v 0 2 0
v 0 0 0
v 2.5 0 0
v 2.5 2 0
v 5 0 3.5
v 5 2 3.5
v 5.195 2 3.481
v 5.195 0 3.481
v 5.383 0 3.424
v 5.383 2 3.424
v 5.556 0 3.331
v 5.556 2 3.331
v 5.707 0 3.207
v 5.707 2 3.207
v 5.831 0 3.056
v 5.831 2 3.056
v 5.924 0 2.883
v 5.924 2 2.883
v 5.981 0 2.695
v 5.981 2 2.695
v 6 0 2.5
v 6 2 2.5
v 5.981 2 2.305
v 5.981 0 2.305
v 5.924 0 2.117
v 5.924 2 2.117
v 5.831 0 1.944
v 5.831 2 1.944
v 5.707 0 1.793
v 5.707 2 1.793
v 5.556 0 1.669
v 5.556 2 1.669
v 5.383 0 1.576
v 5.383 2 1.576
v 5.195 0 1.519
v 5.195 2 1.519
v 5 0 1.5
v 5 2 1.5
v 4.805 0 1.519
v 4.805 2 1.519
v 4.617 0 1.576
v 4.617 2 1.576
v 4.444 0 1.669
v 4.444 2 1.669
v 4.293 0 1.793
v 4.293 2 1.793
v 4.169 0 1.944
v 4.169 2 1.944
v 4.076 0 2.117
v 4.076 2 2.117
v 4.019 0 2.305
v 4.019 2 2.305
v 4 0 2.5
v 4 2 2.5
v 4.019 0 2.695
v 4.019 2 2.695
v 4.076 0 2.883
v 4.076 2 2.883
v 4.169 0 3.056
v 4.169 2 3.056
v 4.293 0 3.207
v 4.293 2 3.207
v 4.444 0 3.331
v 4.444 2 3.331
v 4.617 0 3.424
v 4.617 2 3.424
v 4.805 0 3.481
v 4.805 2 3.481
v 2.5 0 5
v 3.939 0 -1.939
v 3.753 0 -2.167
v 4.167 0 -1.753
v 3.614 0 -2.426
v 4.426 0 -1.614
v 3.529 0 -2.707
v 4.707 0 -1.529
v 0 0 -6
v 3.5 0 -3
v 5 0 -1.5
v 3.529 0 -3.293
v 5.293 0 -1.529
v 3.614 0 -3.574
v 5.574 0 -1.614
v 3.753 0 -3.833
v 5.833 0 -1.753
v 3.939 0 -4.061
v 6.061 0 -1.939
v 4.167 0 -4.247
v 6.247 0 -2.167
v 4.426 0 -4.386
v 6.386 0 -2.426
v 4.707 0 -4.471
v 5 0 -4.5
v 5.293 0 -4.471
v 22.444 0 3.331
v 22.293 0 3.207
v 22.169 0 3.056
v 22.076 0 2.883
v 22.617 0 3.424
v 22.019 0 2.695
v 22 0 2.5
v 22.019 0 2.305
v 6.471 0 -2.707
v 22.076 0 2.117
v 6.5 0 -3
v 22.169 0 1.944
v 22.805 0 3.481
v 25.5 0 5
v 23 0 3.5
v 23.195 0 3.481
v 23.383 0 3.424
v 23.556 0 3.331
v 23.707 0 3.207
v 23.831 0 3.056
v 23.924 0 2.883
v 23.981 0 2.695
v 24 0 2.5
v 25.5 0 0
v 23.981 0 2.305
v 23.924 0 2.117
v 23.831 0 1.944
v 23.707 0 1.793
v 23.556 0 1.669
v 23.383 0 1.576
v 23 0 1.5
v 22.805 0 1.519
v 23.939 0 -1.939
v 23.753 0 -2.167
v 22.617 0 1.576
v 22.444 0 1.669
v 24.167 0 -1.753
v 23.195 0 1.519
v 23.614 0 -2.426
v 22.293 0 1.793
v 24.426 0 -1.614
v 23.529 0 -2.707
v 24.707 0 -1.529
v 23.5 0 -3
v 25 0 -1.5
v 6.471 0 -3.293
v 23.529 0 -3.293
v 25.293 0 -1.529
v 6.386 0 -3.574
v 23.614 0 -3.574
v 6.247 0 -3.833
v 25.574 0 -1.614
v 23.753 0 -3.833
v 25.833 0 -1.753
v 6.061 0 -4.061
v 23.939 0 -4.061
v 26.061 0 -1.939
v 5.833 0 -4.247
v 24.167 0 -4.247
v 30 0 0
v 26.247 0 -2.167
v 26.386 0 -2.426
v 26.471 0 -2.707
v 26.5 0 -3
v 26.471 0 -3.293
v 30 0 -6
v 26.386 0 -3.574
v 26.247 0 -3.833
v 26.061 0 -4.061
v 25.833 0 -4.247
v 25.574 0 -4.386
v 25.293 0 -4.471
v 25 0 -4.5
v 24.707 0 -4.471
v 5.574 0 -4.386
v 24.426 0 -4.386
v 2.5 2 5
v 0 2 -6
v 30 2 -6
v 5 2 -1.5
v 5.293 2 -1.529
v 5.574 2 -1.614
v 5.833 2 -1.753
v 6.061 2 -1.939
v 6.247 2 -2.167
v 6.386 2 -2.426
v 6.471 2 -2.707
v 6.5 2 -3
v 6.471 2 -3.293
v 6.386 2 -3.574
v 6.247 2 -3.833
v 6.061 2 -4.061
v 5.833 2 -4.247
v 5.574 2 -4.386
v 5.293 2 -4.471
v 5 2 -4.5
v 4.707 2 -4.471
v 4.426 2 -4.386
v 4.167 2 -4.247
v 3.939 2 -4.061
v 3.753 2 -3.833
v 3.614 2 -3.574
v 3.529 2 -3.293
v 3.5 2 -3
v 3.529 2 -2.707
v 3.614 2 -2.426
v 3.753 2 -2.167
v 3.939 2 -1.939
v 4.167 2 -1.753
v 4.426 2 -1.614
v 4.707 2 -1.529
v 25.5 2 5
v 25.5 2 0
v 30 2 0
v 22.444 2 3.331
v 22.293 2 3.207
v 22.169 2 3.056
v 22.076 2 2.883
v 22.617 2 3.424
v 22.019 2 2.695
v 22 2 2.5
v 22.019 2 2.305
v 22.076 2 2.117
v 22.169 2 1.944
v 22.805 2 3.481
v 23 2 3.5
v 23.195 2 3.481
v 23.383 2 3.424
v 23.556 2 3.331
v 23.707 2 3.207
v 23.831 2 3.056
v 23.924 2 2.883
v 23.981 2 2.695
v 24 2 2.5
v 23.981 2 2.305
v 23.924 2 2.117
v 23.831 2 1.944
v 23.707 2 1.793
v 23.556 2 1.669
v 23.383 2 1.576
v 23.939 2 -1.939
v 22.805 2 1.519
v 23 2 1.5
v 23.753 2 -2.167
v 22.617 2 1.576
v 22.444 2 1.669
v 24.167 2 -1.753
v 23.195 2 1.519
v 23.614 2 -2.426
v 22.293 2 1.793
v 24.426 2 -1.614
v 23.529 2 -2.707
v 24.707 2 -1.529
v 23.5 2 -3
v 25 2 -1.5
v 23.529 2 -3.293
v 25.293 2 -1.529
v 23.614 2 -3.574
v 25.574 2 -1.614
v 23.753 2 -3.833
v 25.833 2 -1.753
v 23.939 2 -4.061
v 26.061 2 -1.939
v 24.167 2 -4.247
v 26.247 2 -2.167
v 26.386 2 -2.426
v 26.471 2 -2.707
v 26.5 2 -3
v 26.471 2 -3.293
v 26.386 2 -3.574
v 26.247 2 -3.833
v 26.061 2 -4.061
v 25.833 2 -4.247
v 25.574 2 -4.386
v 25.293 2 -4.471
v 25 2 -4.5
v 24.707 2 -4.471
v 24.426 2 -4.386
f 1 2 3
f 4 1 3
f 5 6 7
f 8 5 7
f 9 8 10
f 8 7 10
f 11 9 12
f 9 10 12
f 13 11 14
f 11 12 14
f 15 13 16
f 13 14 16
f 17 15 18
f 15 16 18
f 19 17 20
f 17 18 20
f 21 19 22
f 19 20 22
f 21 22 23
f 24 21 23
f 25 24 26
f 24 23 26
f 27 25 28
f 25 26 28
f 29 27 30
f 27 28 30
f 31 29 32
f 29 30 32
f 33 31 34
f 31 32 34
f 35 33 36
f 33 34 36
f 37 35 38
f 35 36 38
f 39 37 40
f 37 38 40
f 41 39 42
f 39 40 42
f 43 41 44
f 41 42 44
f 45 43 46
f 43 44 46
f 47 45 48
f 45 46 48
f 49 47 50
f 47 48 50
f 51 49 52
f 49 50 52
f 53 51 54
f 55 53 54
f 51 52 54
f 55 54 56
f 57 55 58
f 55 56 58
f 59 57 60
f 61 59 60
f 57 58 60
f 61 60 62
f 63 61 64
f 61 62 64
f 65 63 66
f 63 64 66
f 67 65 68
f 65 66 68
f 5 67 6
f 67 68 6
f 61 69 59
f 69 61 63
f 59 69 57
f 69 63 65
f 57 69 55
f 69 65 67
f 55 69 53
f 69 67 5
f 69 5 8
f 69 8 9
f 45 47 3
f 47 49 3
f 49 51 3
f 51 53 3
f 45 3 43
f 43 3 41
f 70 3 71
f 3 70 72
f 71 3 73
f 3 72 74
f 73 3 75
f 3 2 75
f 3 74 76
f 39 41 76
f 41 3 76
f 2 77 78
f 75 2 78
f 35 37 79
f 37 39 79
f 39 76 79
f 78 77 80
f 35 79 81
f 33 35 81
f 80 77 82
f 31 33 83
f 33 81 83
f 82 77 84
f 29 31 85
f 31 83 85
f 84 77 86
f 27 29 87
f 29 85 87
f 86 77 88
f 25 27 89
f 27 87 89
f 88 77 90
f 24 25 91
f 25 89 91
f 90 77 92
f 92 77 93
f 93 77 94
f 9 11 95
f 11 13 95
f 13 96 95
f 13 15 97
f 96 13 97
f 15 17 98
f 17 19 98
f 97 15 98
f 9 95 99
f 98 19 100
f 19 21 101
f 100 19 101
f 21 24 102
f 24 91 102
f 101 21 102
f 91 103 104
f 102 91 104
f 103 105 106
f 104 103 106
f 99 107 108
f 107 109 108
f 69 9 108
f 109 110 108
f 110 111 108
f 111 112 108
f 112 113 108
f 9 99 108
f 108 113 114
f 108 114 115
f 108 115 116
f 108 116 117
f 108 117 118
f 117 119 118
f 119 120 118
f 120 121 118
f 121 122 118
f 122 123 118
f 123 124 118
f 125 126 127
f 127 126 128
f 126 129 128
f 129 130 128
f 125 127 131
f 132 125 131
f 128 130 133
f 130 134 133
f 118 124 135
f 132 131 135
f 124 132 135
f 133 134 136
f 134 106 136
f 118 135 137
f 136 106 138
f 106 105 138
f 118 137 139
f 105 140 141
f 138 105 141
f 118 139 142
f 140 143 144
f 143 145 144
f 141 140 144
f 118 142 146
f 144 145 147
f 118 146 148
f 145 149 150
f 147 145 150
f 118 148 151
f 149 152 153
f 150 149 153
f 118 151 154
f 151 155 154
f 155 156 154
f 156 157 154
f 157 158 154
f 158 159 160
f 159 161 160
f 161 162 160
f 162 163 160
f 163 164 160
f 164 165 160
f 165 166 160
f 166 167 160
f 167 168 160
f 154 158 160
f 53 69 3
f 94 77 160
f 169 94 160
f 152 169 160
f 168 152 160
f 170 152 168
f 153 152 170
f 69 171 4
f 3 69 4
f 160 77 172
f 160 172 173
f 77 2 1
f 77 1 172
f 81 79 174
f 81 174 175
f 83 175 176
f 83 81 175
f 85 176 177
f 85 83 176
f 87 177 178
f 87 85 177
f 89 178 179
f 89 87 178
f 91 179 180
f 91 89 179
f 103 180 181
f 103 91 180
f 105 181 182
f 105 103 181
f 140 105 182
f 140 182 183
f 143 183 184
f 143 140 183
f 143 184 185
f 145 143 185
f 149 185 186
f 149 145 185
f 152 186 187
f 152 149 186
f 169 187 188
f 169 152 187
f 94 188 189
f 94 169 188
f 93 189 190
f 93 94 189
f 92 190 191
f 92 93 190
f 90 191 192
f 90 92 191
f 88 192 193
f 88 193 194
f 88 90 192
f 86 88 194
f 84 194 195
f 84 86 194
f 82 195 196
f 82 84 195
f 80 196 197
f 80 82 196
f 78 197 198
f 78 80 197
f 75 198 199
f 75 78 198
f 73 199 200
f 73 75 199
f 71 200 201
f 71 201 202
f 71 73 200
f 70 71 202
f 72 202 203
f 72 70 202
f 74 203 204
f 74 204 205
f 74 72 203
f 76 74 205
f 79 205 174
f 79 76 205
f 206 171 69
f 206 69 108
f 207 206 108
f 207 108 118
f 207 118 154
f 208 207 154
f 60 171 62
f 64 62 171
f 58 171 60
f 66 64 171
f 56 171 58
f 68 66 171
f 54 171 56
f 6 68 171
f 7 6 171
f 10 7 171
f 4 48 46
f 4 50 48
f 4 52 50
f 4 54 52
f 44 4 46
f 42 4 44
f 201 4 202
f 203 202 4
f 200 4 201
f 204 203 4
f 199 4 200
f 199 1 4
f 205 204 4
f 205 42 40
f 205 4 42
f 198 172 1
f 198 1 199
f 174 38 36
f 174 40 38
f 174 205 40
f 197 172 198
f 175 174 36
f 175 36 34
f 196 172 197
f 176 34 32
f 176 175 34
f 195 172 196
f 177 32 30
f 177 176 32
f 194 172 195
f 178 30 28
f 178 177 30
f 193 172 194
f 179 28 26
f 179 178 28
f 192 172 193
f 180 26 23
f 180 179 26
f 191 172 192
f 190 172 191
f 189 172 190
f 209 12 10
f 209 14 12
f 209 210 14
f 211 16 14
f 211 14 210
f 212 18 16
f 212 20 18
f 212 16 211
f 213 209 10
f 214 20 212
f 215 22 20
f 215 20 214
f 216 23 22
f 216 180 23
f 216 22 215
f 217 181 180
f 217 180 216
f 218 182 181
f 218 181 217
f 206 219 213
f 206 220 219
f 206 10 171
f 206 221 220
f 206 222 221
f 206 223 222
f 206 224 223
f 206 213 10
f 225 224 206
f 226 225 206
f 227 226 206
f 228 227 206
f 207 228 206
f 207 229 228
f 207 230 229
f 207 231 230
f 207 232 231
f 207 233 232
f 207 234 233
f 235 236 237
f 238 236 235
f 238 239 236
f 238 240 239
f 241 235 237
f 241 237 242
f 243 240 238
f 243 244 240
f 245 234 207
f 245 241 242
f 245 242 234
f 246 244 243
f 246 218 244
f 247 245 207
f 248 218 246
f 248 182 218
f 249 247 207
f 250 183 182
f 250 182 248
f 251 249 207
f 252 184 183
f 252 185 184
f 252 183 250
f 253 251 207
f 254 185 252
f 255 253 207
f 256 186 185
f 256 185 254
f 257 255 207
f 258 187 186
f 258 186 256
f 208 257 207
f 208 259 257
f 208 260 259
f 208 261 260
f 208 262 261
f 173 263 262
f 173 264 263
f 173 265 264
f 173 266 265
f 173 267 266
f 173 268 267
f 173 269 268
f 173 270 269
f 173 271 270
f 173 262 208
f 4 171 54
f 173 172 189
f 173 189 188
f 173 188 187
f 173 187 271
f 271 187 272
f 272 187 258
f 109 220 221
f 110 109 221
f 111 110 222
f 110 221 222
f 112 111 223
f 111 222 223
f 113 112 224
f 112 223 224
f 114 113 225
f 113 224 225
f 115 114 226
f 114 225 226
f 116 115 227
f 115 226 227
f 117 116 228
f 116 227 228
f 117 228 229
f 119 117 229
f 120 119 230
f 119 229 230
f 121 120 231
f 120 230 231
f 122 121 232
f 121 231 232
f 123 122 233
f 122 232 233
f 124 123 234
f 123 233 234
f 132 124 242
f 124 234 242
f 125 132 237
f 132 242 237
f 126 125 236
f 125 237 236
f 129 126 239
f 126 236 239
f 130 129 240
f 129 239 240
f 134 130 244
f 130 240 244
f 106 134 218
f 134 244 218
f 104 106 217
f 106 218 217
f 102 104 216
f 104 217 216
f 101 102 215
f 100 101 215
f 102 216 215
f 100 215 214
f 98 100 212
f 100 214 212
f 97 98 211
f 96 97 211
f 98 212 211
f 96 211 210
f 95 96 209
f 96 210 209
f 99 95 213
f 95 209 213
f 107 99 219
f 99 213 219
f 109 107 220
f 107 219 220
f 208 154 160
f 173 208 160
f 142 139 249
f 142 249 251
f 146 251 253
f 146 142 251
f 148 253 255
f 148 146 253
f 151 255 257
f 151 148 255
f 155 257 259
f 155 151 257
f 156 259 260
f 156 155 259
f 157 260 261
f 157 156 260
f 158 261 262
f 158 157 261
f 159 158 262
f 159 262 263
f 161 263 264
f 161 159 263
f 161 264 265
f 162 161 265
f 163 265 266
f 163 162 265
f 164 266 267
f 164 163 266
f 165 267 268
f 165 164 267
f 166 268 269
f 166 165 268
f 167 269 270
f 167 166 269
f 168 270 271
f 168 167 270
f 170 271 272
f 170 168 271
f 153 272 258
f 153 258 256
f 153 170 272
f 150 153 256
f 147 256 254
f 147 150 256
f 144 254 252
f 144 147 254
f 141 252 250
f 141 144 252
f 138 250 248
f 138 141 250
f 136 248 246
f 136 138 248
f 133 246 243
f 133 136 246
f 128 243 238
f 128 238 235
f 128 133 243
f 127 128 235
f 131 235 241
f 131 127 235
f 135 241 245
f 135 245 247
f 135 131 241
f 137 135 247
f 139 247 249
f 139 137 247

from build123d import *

# Parameters (mm, degrees)
SKETCH_1_W      = 30
SKETCH_1_H      = 6
SKETCH_1_R      = 1.5
EXTRUDE_1_DEPTH = 2
SKETCH_2_W      = 23
SKETCH_2_H      = 5
SKETCH_2_R      = 1
EXTRUDE_2_DEPTH = 2


with BuildPart() as part:
    # 草图1 → 凸台-拉伸1 (new body)
    with BuildSketch(Plane(origin=(0, 0, 0), x_dir=(1, 0, 0), z_dir=(0, 1, 0))):
        with Locations((15, 3)):
            Rectangle(SKETCH_1_W, SKETCH_1_H)
        with Locations(Location((5, 3, 0), (0, 0, 270))):
            Circle(SKETCH_1_R, mode=Mode.SUBTRACT)
        with Locations(Location((25, 3, 0), (0, 0, 270))):
            Circle(SKETCH_1_R, mode=Mode.SUBTRACT)
    extrude(amount=EXTRUDE_1_DEPTH)

    # 草图2 → 凸台-拉伸2 (add)
    with BuildSketch(Plane(origin=(0, 2, 0), x_dir=(1, 0, 0), z_dir=(0, 1, 0))):
        with Locations((14, -2.5)):
            Rectangle(SKETCH_2_W, SKETCH_2_H)
        with Locations(Location((5, -2.5, 0), (0, 0, 270))):
            Circle(SKETCH_2_R, mode=Mode.SUBTRACT)
        with Locations(Location((23, -2.5, 0), (0, 0, 270))):
            Circle(SKETCH_2_R, mode=Mode.SUBTRACT)
    extrude(amount=-EXTRUDE_2_DEPTH)


solid = part.part
